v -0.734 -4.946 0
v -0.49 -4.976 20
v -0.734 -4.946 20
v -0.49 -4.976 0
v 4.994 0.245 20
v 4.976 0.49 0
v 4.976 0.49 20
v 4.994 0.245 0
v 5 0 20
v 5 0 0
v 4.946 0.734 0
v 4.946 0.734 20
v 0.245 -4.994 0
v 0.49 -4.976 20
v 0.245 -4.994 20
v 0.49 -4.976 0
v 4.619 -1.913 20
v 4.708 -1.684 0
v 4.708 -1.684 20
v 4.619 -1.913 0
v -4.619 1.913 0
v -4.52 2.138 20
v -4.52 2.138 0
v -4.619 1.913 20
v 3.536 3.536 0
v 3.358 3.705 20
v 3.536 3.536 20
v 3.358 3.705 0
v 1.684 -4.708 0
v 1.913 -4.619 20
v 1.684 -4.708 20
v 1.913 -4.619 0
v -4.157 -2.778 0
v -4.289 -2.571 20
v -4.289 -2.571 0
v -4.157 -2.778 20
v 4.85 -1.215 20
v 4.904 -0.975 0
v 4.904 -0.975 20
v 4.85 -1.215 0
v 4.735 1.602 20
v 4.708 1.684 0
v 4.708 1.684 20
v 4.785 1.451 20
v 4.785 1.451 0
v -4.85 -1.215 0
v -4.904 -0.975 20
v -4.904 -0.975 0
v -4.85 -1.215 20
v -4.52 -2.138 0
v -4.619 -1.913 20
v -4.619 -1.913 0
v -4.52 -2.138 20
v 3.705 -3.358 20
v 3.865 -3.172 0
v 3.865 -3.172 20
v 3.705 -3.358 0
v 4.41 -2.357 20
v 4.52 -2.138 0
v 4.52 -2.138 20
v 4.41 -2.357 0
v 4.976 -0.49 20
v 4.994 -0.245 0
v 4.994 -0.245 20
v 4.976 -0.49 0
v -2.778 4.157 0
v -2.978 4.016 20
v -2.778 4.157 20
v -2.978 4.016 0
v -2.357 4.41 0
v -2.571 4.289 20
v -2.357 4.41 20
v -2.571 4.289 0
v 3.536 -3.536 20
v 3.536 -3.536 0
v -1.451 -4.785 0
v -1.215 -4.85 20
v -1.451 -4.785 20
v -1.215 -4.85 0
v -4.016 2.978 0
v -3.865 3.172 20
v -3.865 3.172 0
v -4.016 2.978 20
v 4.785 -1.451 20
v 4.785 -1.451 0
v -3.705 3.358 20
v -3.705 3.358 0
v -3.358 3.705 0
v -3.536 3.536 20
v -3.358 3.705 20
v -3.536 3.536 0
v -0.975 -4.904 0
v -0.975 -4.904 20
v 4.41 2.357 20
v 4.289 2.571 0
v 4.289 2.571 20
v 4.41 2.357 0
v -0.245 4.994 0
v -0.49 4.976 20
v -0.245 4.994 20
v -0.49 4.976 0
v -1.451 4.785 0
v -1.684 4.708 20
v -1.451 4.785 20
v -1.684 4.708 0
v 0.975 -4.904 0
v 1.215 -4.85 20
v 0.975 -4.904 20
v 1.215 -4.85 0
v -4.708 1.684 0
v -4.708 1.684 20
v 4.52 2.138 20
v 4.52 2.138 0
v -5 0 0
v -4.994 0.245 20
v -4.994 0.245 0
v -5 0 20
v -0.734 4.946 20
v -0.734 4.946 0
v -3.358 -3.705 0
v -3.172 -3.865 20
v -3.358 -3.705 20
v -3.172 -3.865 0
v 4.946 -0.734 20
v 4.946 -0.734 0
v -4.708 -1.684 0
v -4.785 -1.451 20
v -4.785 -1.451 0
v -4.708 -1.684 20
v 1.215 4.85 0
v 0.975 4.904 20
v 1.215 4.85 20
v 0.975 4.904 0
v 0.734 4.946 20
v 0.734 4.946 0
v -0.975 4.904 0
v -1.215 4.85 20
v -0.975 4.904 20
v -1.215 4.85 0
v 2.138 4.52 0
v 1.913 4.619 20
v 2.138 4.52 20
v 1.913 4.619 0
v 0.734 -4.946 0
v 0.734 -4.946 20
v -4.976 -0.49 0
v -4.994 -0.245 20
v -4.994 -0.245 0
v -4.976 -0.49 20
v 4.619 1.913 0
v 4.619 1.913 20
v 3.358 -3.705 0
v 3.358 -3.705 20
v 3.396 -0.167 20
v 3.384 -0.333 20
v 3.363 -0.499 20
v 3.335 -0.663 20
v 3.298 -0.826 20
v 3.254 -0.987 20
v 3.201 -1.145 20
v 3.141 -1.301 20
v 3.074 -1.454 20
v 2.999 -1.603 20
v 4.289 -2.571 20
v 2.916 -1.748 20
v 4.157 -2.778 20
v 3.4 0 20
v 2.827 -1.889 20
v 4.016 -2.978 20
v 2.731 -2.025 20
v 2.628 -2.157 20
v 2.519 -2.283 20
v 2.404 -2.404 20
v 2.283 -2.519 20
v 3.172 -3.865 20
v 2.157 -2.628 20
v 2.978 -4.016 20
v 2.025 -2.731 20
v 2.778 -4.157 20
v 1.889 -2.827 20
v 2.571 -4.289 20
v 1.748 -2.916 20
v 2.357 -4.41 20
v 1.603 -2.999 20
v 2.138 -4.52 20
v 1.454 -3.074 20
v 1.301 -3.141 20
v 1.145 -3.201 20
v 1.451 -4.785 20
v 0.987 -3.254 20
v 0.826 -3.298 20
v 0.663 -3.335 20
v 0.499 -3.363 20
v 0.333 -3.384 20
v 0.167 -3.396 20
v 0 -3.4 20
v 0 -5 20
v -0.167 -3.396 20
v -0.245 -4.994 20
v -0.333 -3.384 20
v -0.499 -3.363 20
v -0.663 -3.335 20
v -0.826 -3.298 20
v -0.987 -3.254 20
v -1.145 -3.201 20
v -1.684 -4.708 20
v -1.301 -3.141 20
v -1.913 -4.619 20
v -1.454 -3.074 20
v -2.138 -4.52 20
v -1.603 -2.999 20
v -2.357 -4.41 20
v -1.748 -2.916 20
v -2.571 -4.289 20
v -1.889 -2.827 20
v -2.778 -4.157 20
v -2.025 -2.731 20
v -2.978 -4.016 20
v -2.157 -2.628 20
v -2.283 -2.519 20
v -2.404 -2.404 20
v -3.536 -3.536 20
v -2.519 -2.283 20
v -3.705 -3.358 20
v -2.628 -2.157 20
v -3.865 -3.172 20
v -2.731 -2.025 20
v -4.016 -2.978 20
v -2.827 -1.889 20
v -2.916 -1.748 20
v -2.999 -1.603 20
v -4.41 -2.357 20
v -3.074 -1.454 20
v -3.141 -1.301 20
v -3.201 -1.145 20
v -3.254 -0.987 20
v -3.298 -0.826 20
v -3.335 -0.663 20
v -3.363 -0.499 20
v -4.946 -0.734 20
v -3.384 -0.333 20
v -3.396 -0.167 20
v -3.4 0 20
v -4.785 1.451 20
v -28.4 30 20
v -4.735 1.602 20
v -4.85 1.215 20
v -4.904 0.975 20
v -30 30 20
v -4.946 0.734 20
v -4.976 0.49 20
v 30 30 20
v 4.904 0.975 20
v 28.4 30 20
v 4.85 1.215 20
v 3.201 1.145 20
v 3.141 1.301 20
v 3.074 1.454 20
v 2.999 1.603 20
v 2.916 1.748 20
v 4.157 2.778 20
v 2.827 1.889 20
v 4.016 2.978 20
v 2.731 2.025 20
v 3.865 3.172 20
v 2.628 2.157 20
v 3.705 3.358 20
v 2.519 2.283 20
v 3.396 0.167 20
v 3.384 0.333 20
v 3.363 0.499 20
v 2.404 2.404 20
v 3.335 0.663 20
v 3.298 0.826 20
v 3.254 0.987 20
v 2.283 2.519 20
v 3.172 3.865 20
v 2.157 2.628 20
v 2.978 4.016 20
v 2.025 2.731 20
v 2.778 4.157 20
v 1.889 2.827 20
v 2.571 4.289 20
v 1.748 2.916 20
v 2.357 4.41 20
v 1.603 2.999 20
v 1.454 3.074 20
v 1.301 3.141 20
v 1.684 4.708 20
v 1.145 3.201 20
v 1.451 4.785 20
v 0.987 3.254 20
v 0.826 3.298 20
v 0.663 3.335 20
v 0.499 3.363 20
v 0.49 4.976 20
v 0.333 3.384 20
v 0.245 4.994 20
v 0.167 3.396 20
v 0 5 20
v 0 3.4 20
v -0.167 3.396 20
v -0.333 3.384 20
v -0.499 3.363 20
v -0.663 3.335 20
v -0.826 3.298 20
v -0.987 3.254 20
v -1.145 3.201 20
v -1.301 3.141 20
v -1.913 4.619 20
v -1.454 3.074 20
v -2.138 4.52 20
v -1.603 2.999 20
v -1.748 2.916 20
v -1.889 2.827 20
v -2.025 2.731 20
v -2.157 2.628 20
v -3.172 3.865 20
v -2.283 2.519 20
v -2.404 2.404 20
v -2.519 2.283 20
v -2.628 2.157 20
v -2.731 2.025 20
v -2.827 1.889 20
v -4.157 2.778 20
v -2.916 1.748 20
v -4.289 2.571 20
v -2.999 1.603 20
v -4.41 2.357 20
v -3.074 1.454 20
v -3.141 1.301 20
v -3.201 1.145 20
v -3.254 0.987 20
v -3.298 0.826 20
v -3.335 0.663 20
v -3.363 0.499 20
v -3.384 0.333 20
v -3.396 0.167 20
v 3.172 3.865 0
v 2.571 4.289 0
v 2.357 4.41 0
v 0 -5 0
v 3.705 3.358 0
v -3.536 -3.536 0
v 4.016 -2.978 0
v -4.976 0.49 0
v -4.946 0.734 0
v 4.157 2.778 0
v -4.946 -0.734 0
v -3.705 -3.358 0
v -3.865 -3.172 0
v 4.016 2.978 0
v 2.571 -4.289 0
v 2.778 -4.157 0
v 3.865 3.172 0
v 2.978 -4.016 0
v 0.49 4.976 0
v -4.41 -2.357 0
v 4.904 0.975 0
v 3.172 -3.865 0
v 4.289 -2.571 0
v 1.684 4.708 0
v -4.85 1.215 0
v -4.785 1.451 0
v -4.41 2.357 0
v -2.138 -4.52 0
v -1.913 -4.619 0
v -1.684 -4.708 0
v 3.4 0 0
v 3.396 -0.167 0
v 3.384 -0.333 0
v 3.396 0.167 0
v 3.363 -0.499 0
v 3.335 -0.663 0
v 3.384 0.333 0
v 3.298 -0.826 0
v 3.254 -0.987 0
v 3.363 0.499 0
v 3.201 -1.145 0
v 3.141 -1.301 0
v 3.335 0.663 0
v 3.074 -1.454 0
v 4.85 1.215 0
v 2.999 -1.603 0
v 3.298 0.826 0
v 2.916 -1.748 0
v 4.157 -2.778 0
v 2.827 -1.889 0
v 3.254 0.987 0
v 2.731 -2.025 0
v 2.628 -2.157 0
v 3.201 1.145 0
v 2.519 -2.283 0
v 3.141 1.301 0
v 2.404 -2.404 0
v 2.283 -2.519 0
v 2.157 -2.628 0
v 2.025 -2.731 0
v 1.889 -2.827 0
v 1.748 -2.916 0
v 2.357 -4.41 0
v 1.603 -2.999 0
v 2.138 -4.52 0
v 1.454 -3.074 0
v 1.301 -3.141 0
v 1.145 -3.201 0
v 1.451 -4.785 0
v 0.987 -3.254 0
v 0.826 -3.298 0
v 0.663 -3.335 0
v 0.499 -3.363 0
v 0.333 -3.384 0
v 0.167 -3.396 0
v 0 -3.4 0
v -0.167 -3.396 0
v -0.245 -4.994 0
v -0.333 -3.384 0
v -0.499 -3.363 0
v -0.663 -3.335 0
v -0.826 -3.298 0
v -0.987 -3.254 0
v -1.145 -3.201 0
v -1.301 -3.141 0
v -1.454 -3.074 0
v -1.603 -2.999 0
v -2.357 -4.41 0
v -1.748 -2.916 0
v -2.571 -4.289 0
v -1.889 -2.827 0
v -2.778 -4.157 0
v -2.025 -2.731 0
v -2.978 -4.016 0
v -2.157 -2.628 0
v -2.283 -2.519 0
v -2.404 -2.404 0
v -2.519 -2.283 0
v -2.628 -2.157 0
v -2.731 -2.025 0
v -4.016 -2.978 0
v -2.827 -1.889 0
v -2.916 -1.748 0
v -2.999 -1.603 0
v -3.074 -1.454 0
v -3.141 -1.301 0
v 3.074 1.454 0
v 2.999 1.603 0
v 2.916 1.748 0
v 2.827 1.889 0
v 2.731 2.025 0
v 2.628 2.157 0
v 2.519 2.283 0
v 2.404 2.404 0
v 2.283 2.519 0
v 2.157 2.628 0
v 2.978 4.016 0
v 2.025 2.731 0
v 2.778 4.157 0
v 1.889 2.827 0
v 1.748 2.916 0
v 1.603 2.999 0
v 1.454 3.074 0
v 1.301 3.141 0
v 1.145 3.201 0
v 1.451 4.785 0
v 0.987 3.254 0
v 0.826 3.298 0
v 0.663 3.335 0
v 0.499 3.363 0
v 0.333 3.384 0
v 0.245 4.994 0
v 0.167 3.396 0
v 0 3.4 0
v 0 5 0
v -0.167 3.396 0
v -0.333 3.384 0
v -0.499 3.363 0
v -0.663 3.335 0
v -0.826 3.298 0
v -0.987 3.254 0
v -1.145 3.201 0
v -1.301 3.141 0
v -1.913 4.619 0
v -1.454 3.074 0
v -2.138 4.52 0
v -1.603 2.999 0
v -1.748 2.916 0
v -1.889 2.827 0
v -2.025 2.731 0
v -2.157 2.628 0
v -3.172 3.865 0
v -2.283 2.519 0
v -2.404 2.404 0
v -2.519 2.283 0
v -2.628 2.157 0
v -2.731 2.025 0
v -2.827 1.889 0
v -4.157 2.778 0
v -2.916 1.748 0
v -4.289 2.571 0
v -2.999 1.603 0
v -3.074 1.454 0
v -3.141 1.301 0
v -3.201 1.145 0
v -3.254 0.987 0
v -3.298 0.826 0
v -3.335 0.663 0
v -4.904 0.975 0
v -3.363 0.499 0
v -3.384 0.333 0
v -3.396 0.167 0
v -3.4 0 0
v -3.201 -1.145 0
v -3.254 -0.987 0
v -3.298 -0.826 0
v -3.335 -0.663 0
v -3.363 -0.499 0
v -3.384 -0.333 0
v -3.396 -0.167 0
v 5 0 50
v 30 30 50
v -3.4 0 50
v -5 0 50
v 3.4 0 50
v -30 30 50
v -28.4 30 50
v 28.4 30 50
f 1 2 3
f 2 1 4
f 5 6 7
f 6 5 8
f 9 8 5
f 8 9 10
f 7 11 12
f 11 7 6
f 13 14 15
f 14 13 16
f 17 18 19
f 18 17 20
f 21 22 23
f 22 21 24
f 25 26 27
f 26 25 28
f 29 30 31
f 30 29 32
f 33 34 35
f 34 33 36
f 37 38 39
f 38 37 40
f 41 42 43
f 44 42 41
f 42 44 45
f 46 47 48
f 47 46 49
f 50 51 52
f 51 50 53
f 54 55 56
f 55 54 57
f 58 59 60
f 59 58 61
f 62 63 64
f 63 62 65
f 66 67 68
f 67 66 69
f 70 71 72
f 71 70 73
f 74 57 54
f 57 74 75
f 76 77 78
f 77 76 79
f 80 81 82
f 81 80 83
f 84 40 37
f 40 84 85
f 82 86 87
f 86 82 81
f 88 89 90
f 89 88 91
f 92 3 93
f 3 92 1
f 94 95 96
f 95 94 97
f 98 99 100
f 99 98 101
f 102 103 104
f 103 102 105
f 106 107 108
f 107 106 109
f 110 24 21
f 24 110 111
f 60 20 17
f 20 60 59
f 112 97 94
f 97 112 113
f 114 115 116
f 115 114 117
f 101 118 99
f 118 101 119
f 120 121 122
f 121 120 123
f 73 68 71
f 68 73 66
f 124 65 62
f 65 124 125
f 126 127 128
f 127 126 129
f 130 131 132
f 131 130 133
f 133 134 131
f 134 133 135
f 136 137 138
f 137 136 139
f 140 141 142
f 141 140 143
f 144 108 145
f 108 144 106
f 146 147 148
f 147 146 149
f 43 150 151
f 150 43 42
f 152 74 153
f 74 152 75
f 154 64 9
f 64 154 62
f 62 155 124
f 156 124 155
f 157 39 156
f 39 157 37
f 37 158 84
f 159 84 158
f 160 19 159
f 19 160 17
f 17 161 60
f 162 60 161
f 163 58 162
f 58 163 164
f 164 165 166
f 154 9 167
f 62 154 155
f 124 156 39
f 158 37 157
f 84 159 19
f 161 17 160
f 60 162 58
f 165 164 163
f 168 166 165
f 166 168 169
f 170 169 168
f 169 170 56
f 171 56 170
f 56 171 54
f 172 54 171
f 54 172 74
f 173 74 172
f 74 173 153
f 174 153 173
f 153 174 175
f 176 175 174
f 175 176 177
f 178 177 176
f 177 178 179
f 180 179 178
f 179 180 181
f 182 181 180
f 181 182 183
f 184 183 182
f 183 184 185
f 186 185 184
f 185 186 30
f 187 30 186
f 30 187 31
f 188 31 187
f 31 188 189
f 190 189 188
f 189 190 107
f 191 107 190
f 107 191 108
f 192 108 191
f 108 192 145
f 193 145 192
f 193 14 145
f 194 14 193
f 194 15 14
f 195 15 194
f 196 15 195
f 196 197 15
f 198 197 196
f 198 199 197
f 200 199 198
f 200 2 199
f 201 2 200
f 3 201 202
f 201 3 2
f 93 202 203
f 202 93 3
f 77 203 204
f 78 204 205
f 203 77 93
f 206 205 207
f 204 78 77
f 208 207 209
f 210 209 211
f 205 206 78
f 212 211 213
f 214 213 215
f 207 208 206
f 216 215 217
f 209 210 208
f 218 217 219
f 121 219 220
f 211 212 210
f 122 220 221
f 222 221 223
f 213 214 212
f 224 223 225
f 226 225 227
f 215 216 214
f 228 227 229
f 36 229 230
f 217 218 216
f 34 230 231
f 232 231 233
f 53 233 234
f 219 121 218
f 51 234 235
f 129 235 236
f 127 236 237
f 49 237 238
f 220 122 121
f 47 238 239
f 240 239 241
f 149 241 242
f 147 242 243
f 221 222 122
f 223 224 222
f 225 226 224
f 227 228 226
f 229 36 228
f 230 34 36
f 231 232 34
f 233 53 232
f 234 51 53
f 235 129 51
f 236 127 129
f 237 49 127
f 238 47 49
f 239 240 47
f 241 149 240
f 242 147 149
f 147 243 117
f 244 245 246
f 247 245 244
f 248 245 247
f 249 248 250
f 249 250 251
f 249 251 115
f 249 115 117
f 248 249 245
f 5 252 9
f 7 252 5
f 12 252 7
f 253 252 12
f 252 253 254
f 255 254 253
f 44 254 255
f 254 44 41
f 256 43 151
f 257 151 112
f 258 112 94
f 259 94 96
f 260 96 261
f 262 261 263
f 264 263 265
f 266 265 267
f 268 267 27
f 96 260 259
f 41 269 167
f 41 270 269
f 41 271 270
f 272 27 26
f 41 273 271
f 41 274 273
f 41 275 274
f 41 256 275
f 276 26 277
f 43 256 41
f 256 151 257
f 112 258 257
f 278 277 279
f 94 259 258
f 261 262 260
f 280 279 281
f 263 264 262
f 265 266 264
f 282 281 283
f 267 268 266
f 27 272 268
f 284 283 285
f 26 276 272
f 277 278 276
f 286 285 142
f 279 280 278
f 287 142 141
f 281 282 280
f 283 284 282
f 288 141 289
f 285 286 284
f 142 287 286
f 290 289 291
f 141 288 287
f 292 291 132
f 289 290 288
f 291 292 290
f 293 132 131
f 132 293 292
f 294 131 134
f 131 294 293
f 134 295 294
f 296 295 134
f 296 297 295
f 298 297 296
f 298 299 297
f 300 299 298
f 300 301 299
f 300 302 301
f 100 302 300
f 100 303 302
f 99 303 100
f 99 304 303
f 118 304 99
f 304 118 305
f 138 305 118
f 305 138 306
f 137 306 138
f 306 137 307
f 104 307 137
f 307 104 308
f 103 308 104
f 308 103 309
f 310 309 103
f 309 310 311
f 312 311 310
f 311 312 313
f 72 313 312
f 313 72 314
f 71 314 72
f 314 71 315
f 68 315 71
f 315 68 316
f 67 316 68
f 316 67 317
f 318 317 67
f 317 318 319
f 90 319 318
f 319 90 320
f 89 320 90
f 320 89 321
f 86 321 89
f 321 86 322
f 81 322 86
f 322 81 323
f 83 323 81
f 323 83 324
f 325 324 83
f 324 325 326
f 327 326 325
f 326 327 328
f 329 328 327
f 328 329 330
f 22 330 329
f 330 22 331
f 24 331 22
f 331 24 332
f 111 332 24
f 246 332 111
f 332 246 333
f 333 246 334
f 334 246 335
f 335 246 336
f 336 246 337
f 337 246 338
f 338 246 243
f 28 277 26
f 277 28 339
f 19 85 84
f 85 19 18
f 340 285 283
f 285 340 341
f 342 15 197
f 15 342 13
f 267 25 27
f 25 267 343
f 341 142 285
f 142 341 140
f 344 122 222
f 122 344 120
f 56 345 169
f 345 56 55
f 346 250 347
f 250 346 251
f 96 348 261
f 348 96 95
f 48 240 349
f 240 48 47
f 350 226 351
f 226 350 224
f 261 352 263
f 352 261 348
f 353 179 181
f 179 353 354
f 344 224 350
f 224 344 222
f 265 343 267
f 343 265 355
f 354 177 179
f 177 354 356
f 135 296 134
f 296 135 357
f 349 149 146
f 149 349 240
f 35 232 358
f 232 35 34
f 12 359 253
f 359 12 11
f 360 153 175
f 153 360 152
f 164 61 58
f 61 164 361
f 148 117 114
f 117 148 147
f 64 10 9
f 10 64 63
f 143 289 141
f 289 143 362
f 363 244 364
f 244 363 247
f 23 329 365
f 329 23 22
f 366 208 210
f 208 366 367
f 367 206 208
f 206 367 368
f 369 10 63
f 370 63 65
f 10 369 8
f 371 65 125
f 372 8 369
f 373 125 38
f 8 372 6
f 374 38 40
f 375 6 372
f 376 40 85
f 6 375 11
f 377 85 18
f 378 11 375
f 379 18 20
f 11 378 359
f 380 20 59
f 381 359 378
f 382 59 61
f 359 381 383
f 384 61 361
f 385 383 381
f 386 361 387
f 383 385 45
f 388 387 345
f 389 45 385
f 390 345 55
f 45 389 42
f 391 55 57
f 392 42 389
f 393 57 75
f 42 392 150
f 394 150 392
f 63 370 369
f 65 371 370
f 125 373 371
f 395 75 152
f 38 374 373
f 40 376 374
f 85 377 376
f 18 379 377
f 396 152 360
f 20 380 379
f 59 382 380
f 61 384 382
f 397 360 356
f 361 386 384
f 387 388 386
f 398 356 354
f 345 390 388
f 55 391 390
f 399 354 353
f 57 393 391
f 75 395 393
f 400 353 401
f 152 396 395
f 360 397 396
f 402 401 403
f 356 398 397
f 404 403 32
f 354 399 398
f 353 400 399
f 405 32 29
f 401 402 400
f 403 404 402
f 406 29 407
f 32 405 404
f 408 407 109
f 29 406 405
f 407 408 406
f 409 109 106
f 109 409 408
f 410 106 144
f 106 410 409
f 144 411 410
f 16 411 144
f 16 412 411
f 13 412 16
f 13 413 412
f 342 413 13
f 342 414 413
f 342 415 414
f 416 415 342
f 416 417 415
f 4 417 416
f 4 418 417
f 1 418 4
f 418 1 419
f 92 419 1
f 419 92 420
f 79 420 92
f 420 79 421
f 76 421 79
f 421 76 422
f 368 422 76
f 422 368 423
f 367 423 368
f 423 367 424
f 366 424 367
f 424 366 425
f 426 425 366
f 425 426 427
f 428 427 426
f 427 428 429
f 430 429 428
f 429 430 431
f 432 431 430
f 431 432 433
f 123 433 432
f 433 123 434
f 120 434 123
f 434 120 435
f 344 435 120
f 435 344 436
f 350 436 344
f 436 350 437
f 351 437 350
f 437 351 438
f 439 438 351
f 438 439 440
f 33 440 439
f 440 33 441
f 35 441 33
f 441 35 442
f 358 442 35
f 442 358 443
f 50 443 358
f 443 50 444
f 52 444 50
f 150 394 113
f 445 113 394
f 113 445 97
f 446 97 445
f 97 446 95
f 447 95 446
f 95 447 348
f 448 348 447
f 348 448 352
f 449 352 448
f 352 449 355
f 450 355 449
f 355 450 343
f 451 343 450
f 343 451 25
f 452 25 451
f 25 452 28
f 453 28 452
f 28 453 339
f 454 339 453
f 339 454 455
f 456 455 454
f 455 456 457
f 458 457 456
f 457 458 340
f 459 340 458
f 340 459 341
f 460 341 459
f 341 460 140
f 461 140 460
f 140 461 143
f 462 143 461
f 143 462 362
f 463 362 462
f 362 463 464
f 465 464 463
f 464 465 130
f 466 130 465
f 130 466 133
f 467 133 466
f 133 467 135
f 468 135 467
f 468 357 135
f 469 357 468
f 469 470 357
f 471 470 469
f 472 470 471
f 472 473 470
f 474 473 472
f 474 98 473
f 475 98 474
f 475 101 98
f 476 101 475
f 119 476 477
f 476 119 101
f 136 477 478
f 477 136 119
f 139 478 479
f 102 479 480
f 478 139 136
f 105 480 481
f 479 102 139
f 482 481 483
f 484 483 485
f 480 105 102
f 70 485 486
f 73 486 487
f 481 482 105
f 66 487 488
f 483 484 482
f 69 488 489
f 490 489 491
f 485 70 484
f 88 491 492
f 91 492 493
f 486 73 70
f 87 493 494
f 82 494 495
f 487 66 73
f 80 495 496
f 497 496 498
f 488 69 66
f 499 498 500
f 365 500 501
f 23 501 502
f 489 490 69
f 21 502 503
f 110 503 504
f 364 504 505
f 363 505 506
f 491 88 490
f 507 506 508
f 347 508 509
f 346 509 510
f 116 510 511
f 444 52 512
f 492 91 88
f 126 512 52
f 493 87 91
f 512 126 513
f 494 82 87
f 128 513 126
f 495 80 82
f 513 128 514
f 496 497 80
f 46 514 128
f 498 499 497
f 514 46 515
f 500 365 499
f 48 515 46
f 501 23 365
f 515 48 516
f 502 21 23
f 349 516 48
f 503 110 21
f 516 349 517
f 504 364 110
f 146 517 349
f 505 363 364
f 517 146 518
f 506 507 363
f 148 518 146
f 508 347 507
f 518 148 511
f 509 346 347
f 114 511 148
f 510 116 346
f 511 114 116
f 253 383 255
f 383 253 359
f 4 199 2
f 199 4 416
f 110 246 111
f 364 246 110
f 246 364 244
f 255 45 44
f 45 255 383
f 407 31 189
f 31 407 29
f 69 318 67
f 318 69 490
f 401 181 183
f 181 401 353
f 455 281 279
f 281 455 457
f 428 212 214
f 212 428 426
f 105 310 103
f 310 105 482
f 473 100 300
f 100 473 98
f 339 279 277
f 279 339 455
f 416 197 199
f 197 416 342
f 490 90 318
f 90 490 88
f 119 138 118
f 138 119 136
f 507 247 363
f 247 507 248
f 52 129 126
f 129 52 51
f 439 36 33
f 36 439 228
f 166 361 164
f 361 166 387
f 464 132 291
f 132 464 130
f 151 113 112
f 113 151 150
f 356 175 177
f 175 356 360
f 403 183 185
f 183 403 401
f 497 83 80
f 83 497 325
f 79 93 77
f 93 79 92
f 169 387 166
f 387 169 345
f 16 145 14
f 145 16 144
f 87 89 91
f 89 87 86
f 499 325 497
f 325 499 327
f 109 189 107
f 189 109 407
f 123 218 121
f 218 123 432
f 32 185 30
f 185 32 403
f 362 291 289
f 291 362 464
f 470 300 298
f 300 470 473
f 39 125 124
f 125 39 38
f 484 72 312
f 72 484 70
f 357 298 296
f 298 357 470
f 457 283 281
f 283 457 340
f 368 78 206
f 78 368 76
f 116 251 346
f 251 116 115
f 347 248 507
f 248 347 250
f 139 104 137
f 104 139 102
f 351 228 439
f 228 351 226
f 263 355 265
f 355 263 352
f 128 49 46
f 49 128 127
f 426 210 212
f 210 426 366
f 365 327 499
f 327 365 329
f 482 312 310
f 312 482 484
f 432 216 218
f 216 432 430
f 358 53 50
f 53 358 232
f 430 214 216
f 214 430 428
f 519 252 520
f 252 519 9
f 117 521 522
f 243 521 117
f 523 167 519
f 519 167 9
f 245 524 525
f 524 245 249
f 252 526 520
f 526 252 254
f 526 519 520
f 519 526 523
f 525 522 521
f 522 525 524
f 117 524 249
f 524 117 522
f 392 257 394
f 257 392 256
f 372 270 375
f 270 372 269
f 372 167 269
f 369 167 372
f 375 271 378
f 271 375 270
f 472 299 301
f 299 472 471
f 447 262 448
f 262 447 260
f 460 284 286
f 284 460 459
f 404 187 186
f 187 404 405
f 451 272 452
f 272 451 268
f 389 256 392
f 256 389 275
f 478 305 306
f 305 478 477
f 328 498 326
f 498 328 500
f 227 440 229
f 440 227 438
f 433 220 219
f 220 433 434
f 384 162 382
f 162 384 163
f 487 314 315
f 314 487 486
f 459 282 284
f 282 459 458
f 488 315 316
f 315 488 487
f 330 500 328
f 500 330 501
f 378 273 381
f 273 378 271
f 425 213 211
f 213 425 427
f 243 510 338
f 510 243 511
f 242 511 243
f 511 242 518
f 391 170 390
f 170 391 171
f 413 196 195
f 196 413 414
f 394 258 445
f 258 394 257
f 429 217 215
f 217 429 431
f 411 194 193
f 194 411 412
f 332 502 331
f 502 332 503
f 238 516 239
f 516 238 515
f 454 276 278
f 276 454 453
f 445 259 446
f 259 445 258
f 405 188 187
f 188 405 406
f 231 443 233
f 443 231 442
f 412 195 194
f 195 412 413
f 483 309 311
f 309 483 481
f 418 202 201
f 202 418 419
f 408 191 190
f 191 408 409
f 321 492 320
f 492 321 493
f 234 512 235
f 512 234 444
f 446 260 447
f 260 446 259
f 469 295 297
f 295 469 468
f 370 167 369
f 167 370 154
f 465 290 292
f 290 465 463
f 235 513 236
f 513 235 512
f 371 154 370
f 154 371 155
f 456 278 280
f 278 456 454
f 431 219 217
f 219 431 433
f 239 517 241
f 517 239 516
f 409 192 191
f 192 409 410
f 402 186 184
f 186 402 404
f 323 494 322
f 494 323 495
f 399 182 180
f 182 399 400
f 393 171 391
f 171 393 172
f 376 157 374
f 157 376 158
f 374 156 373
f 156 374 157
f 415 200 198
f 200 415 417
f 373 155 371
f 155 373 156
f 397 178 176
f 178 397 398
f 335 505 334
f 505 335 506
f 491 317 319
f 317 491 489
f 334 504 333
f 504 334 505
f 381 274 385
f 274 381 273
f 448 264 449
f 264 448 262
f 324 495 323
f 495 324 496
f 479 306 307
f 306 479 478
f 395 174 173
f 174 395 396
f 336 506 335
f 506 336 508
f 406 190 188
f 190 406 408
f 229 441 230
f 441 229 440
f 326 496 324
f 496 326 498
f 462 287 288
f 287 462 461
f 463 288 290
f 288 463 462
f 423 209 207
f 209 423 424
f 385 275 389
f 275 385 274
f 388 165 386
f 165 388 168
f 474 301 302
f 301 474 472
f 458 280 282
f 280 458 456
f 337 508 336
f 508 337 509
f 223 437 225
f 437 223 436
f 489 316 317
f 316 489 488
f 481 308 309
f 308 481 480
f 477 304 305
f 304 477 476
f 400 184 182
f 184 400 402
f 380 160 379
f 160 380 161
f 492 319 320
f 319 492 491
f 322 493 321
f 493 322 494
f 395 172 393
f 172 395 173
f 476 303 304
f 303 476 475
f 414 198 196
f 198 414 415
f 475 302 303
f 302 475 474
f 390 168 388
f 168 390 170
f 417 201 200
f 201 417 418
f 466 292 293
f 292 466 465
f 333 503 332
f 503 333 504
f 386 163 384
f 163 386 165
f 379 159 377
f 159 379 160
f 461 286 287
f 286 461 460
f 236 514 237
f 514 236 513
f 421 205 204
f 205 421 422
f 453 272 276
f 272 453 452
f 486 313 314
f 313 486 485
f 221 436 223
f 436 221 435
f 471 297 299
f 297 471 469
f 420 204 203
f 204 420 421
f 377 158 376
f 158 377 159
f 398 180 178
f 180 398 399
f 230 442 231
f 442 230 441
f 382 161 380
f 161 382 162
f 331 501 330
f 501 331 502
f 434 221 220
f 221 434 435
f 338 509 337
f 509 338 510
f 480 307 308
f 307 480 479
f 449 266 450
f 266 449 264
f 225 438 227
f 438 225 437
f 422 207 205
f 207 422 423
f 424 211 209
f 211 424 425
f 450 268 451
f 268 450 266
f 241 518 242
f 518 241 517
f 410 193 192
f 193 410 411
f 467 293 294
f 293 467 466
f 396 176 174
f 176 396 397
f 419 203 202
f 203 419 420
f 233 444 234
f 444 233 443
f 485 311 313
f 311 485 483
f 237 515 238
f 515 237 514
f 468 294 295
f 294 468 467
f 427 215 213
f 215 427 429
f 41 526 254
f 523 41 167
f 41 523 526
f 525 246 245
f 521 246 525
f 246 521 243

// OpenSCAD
// Lab Funnel Design - Corrected
// Units: millimetres
// Orientation: Upright, wide opening at top, rests on XY plane at z=0

$fn = 128; // High resolution for smooth curves

// --- Dimensions ---
// Spout (Tube)
spout_outer_diameter = 10;
spout_inner_diameter = 6.8; // 10 - 2*1.6
spout_length = 20;
spout_wall_thickness = 1.6;

// Cone (Funnel)
cone_bottom_outer_diameter = 10; // Matches spout outer
cone_top_outer_diameter = 60;
cone_bottom_z = 20; // Start of cone
cone_top_z = 50;    // End of cone
cone_wall_thickness = 1.6;

// --- Derived Calculations ---
// Cone Geometry
cone_height = cone_top_z - cone_bottom_z;
cone_bottom_outer_radius = cone_bottom_outer_diameter / 2;
cone_top_outer_radius = cone_top_outer_diameter / 2;

// Inner Cone Geometry
// At z=20, inner diameter matches spout inner (6.8)
// At z=50, inner diameter = 60 - 2*1.6 = 56.8
cone_bottom_inner_radius = spout_inner_diameter / 2;
cone_top_inner_radius = (cone_top_outer_diameter / 2) - cone_wall_thickness;

// --- Main Construction ---
// We build the Outer Shell and Inner Void separately to ensure a clean boolean difference.
// This prevents the "separate bodies" error and ensures correct wall thickness.

difference() {
    // 1. Outer Shell
    union() {
        // Spout Outer Cylinder
        translate([0, 0, 0])
            cylinder(
                h = spout_length,
                d = spout_outer_diameter,
                center = false
            );
        
        // Cone Outer Frustum
        // Defined by points: Bottom(-r, 0), Bottom(r, 0), Top(r, h), Top(-r, h)
        translate([0, 0, cone_bottom_z])
            linear_extrude(height = cone_height, center = false)
                polygon(
                    points = [
                        [-cone_bottom_outer_radius, 0],
                        [cone_bottom_outer_radius, 0],
                        [cone_top_outer_radius, cone_height],
                        [-cone_top_outer_radius, cone_height]
                    ]
                );
    }
    
    // 2. Inner Void (The hole for liquid)
    union() {
        // Spout Inner Cylinder
        translate([0, 0, 0])
            cylinder(
                h = spout_length,
                d = spout_inner_diameter,
                center = false
            );
        
        // Cone Inner Frustum
        // Defined by points: Bottom(-r, 0), Bottom(r, 0), Top(r, h), Top(-r, h)
        translate([0, 0, cone_bottom_z])
            linear_extrude(height = cone_height, center = false)
                polygon(
                    points = [
                        [-cone_bottom_inner_radius, 0],
                        [cone_bottom_inner_radius, 0],
                        [cone_top_inner_radius, cone_height],
                        [-cone_top_inner_radius, cone_height]
                    ]
                );
    }
}
